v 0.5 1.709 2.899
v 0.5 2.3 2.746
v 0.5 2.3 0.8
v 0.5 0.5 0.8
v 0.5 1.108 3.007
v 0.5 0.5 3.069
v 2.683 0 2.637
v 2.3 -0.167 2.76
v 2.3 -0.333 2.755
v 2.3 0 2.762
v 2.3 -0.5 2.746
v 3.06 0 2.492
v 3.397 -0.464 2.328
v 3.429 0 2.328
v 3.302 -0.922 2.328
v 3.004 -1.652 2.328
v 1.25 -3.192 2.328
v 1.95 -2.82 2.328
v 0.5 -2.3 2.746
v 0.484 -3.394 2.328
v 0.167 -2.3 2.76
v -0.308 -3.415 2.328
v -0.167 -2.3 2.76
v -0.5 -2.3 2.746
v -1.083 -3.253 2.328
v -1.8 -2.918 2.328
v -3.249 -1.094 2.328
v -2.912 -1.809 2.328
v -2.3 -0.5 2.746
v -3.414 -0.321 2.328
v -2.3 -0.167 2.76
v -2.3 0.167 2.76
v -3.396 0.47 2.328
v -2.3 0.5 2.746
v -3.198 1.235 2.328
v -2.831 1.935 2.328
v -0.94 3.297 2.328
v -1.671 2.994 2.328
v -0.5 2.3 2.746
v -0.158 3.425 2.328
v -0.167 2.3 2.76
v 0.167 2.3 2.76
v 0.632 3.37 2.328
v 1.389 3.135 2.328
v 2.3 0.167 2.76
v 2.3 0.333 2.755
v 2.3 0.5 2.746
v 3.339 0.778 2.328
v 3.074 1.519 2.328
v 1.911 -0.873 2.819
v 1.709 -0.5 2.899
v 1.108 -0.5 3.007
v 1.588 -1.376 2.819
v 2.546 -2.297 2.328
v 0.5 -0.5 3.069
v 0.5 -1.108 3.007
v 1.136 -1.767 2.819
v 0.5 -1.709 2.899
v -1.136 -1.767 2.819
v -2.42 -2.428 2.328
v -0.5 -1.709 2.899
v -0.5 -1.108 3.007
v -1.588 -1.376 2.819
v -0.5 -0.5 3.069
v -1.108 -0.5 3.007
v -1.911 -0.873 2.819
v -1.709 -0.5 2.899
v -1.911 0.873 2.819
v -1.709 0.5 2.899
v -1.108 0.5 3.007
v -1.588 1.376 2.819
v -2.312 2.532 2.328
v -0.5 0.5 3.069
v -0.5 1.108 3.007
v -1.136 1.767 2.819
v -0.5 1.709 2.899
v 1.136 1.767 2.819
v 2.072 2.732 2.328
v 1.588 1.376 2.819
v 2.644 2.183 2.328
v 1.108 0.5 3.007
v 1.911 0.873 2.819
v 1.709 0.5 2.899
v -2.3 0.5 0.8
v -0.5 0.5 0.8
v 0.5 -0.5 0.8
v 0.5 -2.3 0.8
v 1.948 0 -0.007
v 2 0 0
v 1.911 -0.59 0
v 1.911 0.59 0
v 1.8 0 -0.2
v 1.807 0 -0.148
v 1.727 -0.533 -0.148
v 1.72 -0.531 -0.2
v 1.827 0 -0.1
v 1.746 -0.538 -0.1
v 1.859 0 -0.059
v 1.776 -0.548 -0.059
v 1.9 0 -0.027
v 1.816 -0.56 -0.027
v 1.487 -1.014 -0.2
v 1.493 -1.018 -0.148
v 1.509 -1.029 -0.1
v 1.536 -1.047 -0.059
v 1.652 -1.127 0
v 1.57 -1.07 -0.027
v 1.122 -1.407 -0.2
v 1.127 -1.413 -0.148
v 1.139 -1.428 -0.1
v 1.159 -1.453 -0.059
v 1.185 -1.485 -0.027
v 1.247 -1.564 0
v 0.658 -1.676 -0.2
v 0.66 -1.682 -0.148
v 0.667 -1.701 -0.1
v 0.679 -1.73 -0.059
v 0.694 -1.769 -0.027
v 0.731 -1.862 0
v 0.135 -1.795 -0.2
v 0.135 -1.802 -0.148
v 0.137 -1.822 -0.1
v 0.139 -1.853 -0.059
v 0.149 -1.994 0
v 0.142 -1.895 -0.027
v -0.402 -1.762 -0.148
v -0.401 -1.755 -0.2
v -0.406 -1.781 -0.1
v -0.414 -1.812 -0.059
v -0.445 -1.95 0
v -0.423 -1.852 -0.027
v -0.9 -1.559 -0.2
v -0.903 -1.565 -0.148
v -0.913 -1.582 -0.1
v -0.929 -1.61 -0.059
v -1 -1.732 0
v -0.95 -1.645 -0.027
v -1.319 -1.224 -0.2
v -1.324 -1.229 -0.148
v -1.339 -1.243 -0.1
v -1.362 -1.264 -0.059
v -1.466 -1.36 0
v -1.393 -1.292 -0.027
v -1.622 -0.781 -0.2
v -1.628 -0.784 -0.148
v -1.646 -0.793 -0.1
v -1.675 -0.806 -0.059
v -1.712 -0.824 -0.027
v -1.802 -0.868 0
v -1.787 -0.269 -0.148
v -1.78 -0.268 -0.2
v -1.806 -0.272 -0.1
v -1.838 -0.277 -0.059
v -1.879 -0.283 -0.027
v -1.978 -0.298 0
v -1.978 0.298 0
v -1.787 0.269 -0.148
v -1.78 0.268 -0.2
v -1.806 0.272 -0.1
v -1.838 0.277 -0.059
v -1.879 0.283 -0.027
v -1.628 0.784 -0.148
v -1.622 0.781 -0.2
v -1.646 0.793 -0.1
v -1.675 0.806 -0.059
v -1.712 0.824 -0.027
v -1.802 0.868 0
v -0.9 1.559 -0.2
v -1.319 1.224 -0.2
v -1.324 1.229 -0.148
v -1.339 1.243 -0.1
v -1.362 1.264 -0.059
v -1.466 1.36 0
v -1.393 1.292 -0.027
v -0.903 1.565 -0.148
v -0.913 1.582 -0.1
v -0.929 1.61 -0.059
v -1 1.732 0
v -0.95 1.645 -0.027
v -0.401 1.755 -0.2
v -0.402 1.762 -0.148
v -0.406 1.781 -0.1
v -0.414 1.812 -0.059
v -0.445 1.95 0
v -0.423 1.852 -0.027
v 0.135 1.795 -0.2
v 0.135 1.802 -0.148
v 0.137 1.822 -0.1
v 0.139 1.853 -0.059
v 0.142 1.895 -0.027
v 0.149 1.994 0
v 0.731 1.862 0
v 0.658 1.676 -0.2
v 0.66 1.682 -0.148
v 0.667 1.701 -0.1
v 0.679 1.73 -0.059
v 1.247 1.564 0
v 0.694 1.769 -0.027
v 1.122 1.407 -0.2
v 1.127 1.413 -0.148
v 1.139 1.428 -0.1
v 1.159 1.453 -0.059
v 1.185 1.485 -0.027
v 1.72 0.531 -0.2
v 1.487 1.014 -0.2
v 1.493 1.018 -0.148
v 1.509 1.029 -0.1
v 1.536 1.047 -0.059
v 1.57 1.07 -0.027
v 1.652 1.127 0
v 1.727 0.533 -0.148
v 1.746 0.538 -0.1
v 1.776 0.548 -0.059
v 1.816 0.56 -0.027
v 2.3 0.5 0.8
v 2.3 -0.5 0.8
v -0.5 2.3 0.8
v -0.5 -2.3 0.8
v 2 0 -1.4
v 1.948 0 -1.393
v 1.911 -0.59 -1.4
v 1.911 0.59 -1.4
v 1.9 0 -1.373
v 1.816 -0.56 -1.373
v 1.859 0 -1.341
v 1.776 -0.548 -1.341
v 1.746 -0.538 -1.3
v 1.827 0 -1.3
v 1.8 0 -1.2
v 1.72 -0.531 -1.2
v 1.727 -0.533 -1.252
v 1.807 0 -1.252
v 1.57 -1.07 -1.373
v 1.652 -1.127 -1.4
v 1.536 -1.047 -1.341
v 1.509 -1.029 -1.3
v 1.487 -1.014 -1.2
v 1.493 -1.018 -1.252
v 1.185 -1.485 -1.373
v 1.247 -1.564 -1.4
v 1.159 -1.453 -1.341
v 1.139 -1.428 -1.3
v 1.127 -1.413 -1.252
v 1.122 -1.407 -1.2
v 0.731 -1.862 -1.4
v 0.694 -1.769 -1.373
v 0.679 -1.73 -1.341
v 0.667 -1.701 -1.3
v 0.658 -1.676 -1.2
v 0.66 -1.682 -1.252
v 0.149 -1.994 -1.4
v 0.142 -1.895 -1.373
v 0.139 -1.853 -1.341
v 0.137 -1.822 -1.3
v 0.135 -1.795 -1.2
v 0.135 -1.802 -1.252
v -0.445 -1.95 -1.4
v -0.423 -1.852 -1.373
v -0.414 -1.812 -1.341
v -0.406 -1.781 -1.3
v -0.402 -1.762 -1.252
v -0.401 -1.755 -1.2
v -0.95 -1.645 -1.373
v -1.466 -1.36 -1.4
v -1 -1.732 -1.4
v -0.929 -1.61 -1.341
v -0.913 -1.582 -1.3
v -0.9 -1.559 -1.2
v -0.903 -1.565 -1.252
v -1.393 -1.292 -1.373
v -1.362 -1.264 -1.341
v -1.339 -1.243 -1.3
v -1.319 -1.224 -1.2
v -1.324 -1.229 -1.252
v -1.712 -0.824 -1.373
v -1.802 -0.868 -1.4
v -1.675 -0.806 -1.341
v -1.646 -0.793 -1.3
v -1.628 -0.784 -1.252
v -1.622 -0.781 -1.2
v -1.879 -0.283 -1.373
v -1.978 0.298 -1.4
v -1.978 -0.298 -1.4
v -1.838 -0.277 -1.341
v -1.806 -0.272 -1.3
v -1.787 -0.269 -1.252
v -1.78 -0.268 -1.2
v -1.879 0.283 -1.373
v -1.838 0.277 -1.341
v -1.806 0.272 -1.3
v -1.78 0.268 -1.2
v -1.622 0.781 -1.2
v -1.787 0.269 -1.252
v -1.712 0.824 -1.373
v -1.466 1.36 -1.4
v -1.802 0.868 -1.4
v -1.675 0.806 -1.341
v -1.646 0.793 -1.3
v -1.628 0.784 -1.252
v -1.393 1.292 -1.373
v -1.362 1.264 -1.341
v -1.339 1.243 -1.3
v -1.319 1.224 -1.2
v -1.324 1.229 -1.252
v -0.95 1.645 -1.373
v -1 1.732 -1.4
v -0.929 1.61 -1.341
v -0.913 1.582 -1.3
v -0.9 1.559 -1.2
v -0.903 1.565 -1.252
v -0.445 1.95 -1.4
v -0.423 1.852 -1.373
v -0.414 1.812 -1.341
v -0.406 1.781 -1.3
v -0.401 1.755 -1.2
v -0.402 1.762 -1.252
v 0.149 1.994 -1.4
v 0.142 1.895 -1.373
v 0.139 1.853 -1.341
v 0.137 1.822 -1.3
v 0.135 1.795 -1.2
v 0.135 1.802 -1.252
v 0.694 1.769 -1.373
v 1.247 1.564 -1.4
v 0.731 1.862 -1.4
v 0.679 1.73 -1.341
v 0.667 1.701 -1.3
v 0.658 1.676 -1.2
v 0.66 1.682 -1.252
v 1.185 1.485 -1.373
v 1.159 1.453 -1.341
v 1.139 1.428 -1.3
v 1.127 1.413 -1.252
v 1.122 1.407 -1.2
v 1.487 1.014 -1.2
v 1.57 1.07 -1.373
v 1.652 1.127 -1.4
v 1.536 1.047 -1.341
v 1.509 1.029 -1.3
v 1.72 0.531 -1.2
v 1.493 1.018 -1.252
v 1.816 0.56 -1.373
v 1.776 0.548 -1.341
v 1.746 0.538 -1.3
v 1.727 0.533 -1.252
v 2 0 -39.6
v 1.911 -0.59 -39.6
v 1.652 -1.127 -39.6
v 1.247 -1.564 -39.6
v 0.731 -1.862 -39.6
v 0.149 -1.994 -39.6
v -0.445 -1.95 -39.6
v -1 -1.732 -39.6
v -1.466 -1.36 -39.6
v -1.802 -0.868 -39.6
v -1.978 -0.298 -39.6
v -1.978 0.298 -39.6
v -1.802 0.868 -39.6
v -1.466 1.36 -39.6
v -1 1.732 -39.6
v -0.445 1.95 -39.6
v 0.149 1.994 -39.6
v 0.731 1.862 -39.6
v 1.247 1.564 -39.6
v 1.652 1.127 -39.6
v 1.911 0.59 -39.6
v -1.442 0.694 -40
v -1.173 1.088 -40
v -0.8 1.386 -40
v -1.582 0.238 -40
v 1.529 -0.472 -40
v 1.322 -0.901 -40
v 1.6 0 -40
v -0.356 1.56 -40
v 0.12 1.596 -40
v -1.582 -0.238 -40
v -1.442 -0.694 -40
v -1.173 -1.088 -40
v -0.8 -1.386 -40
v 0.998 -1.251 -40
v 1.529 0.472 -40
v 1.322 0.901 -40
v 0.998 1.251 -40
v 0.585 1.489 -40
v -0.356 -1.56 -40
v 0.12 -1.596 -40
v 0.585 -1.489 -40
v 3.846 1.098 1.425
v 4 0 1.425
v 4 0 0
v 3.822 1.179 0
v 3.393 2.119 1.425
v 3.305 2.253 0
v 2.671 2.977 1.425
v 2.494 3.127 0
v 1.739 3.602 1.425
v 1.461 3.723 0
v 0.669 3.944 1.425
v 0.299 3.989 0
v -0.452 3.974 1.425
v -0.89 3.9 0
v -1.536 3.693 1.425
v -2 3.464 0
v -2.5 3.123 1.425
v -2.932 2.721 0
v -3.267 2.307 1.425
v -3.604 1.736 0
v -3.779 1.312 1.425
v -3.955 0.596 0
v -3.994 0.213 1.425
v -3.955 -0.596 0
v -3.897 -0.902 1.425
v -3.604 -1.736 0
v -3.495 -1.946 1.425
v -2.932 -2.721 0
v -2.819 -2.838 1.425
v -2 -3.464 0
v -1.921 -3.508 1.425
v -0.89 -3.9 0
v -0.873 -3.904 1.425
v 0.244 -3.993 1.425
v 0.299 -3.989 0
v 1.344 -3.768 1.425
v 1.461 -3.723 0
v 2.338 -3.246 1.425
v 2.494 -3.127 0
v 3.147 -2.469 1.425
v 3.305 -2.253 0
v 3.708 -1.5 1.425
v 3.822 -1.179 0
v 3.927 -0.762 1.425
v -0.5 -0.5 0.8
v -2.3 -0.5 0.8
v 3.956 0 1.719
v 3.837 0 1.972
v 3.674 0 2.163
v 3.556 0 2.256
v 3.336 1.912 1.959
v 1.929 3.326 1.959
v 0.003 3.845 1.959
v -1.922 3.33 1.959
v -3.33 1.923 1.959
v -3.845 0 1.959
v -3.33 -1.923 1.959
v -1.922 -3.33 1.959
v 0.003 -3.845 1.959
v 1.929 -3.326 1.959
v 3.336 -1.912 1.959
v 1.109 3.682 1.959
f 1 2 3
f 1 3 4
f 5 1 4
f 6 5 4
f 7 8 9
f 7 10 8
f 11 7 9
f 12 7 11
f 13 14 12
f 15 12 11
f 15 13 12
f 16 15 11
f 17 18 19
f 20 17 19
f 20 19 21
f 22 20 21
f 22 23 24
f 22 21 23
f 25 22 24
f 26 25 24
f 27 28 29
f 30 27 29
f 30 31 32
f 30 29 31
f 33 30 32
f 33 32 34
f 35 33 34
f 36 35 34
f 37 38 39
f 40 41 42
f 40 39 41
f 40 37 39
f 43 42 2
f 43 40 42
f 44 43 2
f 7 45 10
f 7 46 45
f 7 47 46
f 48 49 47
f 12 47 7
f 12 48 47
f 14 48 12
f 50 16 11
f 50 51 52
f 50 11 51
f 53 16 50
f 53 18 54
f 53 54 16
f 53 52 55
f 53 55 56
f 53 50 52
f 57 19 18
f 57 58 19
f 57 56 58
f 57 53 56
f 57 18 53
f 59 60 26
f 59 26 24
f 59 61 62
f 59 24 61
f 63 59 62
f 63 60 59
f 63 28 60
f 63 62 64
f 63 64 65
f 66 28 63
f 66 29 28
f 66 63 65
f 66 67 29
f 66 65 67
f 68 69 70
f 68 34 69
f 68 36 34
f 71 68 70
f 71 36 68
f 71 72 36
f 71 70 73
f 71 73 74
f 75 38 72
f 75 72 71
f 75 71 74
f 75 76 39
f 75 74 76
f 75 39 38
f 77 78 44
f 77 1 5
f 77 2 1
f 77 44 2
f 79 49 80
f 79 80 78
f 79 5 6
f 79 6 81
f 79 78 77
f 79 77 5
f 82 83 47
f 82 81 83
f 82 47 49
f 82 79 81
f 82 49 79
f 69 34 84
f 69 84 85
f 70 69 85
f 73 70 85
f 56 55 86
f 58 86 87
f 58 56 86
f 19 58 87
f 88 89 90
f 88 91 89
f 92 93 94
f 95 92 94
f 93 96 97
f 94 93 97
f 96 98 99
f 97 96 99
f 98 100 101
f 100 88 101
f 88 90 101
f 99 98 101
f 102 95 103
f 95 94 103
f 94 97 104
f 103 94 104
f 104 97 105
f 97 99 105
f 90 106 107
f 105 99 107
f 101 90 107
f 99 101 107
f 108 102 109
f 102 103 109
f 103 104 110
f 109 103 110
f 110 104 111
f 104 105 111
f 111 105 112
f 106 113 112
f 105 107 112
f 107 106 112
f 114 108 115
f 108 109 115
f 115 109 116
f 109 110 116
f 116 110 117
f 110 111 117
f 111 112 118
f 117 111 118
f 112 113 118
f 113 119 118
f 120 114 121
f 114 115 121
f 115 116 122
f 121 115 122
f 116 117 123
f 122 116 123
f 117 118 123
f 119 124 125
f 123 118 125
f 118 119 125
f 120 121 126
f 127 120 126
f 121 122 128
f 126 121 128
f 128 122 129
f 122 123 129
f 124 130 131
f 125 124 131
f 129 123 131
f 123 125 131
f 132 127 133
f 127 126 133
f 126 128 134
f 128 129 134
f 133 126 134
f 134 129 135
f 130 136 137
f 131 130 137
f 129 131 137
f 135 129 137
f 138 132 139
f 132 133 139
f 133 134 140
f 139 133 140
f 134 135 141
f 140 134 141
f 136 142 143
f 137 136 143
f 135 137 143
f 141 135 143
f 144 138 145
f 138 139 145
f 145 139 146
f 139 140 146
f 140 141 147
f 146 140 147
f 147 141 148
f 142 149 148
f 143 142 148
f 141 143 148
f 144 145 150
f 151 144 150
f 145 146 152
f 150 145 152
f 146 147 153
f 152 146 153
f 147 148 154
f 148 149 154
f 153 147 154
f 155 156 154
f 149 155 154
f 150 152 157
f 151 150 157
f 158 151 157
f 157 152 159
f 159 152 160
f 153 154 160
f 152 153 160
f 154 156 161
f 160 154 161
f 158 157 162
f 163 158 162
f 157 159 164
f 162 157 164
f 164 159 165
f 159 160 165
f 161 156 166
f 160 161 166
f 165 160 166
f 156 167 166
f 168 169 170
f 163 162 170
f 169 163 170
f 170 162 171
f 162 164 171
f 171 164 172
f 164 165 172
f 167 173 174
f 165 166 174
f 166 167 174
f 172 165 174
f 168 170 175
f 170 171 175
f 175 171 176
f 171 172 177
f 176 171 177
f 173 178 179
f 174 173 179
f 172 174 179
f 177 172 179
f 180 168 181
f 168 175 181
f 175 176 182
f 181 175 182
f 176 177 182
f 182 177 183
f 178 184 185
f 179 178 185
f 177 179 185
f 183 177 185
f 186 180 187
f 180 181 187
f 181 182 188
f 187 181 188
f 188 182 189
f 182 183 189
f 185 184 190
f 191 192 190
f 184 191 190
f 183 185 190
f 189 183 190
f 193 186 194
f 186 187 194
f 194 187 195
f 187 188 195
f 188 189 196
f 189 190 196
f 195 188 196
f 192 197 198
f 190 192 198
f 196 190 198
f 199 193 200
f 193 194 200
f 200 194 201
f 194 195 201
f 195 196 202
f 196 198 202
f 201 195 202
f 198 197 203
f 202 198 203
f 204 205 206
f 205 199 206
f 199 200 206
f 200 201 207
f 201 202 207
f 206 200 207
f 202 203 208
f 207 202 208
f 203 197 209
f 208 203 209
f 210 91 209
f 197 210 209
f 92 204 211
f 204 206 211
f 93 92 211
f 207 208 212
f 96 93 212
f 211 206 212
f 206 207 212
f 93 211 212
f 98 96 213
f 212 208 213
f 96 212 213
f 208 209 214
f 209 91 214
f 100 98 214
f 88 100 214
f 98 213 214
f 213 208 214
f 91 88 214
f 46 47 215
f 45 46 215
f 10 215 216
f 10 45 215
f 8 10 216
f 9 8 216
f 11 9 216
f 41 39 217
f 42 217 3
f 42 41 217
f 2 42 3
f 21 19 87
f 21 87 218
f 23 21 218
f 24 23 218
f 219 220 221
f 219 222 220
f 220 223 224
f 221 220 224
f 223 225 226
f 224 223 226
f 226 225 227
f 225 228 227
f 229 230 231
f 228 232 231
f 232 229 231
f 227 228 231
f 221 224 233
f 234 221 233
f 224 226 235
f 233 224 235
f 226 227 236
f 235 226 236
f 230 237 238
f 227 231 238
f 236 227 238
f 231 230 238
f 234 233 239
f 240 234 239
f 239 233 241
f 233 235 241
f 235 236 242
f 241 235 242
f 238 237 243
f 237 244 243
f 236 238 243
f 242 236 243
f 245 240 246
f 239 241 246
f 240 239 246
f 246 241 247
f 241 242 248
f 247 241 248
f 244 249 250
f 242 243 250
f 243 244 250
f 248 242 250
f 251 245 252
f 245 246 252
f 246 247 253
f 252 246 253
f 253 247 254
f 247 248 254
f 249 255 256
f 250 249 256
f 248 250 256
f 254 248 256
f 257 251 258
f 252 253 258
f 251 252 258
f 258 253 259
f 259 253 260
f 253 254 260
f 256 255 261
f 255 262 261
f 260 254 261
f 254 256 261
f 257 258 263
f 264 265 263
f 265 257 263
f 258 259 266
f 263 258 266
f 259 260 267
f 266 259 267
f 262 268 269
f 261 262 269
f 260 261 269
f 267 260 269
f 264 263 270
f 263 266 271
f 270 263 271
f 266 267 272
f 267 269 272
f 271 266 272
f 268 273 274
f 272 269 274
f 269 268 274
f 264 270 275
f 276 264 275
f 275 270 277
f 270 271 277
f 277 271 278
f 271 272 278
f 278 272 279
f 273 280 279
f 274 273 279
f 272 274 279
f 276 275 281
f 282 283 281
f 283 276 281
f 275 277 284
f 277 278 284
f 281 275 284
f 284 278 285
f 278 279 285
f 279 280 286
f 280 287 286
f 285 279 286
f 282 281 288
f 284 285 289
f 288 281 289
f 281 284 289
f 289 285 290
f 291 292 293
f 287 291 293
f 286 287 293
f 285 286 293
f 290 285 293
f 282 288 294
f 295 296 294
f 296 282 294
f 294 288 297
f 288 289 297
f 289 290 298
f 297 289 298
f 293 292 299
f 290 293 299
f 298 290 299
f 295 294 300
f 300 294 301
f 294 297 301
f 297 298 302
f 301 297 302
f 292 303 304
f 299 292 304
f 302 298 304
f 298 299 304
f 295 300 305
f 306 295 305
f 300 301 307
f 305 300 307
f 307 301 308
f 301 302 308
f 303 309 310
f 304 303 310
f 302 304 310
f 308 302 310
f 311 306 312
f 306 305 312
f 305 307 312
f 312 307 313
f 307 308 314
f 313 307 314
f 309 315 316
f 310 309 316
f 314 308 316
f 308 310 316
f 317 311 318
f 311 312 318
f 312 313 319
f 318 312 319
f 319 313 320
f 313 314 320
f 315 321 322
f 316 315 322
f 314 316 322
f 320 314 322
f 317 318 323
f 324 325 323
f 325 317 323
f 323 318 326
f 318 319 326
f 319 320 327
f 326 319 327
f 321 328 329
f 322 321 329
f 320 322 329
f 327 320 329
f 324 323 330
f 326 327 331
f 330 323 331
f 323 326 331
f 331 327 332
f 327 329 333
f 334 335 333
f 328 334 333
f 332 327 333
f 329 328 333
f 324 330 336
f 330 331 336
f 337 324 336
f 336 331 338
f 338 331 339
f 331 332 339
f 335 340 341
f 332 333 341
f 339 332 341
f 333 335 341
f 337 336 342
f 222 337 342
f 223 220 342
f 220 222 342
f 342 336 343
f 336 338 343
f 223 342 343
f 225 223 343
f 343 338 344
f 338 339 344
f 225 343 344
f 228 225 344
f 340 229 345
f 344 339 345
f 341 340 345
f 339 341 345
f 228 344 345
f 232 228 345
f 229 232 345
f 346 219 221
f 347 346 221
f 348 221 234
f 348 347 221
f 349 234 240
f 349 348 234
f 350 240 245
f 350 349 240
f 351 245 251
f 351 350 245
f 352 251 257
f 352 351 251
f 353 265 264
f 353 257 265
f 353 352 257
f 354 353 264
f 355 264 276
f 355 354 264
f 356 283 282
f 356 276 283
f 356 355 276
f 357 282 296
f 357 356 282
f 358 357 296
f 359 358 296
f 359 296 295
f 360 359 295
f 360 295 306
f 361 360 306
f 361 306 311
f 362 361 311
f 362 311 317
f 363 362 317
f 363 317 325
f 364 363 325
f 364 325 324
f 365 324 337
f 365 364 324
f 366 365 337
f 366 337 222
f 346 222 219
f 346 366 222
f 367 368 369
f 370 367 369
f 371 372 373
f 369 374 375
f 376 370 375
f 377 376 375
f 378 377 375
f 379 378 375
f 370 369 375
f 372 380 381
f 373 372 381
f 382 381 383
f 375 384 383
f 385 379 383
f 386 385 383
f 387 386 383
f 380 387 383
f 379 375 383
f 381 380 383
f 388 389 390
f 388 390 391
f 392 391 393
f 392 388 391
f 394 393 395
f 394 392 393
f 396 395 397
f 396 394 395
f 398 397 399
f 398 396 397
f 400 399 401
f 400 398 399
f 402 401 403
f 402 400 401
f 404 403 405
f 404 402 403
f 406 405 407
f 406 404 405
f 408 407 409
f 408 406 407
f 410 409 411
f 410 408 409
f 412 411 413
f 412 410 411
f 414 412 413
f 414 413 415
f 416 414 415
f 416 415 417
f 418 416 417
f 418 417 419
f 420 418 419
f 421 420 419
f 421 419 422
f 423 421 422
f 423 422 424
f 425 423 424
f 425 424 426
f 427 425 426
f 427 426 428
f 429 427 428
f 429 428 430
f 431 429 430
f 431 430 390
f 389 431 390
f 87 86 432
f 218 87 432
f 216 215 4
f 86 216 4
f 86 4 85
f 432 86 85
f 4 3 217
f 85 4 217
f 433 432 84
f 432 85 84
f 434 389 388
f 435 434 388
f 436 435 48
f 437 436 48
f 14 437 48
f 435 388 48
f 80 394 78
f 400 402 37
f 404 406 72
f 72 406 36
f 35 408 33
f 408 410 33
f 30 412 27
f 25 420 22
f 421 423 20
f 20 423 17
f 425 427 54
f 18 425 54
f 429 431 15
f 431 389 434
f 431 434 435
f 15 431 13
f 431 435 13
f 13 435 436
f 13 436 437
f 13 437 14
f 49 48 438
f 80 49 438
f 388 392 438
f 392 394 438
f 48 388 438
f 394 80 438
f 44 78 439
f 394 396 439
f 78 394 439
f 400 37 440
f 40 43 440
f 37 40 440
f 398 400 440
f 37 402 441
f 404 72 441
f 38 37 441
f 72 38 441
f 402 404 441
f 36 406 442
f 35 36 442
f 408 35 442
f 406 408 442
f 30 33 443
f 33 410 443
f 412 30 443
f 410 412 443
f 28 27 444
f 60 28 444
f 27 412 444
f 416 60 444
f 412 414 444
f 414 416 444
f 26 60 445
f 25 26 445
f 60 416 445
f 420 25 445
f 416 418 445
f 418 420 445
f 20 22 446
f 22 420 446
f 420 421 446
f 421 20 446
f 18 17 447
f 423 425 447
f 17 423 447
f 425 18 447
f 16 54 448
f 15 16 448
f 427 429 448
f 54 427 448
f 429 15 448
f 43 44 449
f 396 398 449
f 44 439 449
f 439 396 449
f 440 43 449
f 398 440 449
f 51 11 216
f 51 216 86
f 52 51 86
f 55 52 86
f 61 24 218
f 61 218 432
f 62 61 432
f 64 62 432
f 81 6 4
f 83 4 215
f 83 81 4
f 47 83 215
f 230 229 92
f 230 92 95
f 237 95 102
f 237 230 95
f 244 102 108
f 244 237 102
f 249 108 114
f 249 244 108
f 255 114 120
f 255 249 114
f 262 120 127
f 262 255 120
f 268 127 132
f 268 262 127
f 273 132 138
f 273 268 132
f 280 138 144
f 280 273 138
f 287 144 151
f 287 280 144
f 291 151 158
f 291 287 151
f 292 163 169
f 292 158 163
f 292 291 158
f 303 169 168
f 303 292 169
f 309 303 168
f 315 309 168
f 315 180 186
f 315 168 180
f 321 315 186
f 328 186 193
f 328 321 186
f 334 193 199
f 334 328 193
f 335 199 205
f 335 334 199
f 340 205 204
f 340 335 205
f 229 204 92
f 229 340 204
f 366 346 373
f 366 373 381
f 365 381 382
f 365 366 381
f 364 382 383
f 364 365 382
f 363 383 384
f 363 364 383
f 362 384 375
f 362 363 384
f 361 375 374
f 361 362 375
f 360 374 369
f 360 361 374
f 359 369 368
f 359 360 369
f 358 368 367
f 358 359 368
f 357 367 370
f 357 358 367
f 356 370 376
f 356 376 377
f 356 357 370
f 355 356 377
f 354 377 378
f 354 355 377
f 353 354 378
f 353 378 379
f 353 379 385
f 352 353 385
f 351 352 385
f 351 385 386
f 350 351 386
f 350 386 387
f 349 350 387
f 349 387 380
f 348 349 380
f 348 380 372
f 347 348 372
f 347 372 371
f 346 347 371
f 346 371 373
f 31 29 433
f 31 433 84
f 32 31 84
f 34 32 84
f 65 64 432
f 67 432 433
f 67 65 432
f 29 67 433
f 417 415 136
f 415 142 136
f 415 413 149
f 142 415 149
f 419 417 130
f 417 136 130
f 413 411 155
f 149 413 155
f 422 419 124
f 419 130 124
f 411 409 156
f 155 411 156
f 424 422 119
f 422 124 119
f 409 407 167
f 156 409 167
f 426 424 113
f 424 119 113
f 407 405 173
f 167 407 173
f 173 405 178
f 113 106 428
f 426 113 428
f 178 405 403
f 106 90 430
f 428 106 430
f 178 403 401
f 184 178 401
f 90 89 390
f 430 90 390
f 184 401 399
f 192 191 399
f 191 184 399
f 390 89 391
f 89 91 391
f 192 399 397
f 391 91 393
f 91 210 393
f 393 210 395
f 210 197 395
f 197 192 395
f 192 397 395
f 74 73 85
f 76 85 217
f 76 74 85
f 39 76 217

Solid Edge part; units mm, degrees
sketch "Sketch1" plane through (0, 0, 0) normal (0, -1, 0) x (1, 0, 0)
  line L0 (4, 0) -> (1.8, 0)
  line L1 (1.8, 0) -> (1.8, -1.4)
  line L2 (1.8, -1.4) -> (2, -1.4)
  line L3 (2, -1.4) -> (2, -40)
  line L4 (2, -40) -> (0, -40)
  arc A0 (0, 3.1) -> (4, 2.0282) centre (0, -4.9) cw
  line L5 (4, 0) -> (4, 2.0282)
  dimension "D1" = 40
  dimension "D2" = 1.4
  dimension "D3" = 0.2
  dimension "D4" = 8
  dimension "D5" = 3.1
revolve "RevolvedProtrusion1" add sketch "Sketch1" angle 360 about axis through (0, 0, -6) along (0, 0, 1)
cosmetic_thread "Thread1" size "M4"
chamfer "Chamfer_1" distance 0.4 angle 45 1 edges at (-2, 0, -40)
fillet "Round1" radius 0.2 2 edges at (-1.8, 0, -1.4) (-1.8, 0, 0)
fillet "Round_3" radius 1 1 edges at (-4, 0, 2.0282)
sketch "Sketch2" plane through (0, 0, 3.1) normal (0, 0, 1) x (1, 0, 0)
  line L0 (-0.5, 0.5) -> (-0.5, 2.3)
  line L1 (-0.5, 2.3) -> (0.5, 2.3)
  line L2 (0.5, 2.3) -> (0.5, 0.5)
  line L3 (0.5, 0.5) -> (2.3, 0.5)
  line L4 (2.3, 0.5) -> (2.3, -0.5)
  line L5 (2.3, -0.5) -> (0.5, -0.5)
  line L6 (0.5, -0.5) -> (0.5, -2.3)
  line L7 (0.5, -2.3) -> (-0.5, -2.3)
  line L8 (-0.5, -2.3) -> (-0.5, -0.5)
  line L9 (-0.5, -0.5) -> (-2.3, -0.5)
  line L10 (-2.3, -0.5) -> (-2.3, 0.5)
  line L11 (-2.3, 0.5) -> (-0.5, 0.5)
  dimension "D1" = 4.6
  dimension "D2" = 1
extrude "ExtrudedCutout_2" cut sketch "Sketch2" against normal blind 2.3
properties material "Galvanized steel"
